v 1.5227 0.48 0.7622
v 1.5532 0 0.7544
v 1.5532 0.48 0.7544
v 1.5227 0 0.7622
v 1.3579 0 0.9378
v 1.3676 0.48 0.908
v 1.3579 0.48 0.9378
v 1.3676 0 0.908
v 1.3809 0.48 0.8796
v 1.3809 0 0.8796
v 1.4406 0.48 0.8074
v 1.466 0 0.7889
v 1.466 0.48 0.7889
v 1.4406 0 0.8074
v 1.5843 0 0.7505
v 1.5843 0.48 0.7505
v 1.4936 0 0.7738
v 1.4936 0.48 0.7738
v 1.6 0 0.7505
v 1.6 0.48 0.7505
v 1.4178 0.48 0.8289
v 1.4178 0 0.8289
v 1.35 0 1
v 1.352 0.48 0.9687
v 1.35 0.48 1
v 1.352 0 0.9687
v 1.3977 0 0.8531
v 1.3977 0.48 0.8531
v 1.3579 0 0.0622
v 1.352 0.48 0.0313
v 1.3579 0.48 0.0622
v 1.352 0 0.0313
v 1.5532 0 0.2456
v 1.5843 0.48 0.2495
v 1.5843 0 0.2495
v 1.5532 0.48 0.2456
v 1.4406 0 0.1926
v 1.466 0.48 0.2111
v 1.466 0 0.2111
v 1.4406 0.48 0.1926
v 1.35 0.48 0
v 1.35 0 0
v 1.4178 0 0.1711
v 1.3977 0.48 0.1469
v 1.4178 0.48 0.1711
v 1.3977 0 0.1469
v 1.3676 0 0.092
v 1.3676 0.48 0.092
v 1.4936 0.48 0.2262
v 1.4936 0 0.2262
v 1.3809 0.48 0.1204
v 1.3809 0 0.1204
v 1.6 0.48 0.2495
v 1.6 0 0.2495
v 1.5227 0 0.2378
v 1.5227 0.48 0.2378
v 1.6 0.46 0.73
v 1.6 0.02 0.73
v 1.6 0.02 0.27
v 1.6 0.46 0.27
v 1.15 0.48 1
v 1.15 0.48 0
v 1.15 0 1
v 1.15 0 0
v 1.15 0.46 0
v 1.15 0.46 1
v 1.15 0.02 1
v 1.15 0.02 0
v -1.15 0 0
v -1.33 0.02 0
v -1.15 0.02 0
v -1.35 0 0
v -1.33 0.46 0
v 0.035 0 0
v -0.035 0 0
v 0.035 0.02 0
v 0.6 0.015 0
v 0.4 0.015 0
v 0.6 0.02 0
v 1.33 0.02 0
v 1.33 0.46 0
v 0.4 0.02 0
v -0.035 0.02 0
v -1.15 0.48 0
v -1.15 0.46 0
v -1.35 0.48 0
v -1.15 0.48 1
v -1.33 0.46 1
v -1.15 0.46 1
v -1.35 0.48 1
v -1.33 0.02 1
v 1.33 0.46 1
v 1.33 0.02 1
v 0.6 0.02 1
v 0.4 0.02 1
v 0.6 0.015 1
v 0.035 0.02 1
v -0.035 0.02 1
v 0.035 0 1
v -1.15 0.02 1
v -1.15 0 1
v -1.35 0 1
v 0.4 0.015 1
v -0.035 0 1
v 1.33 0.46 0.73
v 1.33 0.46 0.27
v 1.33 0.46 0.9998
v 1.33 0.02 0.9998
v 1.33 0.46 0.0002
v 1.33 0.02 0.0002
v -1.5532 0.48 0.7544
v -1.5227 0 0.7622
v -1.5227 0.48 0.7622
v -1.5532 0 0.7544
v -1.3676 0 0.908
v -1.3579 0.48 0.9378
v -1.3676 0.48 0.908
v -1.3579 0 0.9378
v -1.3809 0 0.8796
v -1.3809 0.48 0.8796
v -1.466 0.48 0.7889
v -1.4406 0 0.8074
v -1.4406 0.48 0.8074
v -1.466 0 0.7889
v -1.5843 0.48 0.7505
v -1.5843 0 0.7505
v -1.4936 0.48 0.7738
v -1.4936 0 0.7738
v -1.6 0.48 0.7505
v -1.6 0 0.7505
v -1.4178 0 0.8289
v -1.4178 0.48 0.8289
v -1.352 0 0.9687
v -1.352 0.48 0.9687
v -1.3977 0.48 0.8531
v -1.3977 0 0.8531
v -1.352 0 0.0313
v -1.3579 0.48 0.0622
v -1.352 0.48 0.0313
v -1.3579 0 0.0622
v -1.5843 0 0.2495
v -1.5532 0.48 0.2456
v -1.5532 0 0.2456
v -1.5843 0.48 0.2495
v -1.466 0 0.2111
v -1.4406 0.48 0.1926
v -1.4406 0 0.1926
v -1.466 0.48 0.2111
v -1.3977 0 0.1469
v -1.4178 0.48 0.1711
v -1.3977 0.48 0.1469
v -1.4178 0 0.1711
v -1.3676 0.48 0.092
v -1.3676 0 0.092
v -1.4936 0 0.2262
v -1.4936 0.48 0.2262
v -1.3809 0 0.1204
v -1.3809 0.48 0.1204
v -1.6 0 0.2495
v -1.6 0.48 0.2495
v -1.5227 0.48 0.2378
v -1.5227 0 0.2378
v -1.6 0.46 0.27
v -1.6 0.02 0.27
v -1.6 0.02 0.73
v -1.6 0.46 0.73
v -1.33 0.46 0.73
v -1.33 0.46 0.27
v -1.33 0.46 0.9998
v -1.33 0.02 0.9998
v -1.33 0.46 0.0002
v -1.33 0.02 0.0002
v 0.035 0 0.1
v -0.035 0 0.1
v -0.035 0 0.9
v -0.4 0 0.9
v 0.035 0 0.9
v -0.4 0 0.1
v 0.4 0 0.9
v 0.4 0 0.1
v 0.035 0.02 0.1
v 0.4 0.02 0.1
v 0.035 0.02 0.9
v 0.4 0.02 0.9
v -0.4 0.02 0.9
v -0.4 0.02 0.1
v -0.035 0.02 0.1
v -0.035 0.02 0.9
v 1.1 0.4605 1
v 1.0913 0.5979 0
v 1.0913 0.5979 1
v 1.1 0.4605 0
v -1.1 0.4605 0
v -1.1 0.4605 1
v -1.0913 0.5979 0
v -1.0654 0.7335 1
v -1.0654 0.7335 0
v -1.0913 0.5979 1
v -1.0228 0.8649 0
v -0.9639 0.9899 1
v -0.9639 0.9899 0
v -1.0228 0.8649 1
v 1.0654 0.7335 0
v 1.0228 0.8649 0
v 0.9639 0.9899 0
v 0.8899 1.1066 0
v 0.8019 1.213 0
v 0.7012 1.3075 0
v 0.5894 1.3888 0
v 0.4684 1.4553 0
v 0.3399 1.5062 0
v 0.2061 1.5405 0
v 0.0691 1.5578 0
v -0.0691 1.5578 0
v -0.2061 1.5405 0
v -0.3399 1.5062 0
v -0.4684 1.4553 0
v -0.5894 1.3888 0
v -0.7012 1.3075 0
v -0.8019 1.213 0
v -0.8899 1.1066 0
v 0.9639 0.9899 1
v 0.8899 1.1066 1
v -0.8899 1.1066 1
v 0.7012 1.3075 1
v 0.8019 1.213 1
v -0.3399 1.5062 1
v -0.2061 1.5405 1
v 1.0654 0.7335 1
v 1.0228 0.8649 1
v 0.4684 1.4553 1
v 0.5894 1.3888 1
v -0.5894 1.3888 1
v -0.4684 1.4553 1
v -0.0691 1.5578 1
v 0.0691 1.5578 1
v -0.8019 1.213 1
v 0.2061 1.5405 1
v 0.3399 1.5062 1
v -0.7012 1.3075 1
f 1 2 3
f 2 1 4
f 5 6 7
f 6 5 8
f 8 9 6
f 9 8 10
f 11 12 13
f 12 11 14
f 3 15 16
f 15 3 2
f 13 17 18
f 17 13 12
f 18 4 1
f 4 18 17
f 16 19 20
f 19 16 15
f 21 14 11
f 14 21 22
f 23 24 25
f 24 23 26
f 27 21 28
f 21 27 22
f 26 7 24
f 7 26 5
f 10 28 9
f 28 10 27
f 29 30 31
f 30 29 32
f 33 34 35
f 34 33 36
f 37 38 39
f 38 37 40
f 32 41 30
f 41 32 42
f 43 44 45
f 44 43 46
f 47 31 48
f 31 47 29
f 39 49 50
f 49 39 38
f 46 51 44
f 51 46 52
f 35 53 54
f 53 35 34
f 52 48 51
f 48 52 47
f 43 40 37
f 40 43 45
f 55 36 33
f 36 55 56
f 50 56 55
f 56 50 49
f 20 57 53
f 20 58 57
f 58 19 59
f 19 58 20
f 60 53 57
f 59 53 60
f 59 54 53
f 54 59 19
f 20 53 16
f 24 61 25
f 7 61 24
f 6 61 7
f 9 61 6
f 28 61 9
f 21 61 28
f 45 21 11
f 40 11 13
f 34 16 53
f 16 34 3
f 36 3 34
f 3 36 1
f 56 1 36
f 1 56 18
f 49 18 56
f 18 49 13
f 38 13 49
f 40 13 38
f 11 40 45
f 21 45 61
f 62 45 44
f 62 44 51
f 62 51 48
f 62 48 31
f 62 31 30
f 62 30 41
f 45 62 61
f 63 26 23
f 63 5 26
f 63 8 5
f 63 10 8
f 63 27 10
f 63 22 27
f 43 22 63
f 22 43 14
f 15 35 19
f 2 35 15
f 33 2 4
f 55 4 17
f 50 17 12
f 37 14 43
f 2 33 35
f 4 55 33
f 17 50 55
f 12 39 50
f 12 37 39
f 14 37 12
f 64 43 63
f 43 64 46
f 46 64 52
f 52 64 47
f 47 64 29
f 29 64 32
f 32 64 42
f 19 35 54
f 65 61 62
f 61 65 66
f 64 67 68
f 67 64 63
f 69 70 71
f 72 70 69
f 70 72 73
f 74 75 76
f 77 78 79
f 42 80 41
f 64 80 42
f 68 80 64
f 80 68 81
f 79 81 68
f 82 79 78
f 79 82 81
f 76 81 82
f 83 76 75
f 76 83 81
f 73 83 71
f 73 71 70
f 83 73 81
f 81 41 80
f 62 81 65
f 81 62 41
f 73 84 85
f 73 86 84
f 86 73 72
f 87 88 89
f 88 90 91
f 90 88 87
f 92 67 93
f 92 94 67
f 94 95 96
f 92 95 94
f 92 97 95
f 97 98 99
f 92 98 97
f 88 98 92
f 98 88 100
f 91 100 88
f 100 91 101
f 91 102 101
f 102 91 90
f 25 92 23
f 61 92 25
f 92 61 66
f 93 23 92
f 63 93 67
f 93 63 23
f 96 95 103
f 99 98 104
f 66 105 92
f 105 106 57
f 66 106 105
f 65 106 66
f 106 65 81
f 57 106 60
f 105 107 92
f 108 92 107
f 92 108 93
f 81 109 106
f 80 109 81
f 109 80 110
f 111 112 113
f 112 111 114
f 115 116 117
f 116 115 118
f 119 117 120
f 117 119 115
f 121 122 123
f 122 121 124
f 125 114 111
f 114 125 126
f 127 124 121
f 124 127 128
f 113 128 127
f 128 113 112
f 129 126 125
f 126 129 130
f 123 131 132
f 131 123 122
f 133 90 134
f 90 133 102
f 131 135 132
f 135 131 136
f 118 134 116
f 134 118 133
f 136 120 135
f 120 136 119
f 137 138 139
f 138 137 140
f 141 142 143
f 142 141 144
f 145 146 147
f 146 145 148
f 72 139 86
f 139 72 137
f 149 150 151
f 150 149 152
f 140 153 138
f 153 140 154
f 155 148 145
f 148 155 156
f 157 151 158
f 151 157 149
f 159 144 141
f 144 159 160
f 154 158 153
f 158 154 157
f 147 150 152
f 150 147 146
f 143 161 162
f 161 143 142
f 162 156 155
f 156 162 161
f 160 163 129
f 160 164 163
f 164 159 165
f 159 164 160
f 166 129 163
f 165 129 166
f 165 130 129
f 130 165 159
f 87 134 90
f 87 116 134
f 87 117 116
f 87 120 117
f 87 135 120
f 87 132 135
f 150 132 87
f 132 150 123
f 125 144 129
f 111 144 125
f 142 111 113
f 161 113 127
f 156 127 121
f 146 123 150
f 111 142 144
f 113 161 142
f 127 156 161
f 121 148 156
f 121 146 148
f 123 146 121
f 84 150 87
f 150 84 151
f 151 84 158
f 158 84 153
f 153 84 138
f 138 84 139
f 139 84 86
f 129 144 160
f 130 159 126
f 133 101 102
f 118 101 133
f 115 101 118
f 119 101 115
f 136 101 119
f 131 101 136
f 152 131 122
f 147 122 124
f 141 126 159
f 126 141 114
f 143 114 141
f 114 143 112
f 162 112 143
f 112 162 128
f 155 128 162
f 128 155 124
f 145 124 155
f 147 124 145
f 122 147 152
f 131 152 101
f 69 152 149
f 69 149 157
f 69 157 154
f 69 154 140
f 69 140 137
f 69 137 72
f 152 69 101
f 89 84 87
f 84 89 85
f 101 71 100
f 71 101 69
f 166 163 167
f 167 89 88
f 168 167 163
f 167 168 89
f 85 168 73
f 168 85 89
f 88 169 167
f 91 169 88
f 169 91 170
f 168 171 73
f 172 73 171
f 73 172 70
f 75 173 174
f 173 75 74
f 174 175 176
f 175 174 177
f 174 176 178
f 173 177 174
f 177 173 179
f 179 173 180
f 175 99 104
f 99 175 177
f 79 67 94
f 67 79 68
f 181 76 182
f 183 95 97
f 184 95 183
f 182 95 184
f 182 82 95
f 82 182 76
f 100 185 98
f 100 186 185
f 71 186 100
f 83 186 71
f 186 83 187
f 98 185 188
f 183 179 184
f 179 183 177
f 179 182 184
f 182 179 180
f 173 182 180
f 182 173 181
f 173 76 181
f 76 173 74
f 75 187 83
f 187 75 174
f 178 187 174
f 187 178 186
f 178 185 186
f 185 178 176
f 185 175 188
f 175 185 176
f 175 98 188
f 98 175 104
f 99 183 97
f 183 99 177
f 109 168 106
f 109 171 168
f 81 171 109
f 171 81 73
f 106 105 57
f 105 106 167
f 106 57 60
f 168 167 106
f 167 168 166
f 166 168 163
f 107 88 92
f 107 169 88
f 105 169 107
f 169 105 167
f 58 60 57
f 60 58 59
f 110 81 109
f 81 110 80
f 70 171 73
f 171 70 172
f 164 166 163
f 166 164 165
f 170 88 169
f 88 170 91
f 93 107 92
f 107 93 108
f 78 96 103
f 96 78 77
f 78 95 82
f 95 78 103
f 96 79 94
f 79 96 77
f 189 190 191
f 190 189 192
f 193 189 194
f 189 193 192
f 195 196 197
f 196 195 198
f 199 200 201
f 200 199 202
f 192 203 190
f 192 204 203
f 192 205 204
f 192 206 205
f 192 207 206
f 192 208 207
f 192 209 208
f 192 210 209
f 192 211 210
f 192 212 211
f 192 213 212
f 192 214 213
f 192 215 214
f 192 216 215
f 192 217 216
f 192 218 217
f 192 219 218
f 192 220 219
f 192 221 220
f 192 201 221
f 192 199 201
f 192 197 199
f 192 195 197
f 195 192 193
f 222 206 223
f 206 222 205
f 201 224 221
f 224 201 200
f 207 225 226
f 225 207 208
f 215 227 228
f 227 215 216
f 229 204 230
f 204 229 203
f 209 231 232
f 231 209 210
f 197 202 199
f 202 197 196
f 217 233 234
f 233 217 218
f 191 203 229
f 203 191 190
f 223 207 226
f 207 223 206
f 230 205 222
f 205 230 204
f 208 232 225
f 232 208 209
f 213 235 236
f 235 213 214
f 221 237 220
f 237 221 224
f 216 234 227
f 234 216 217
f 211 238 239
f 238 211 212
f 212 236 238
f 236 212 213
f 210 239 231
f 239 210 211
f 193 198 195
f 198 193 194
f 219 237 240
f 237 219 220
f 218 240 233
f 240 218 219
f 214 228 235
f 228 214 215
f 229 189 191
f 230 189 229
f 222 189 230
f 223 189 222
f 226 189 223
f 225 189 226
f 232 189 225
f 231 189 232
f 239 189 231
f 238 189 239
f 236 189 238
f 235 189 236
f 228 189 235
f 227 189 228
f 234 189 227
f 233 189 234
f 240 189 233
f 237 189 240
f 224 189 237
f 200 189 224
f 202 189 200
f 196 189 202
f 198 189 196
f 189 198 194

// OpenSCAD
//by Knochi 2022/12/01 - mail@knochi.de
//export to .csg then open in FreeCad and save to KiCAD using KicadStepUp Workbench

/* [Dimensions] */
bodyDims=[3.2,1.0,0.48]; //including pads
capWidth=0.45;
filRad=0.25;
plating=0.02;
marking=0.005;
domeDia=2.2;


/* [Hidden] */
$fn=50;
fudge=0.1;
ledAlpha=0.1;
glassAlpha=0.39;

metalGreyPinCol=    [0.824, 0.820,  0.781];
metalGreyCol=       [0.298, 0.298,  0.298]; //metal Grey
metalCopperCol=     [0.7038,0.27048,0.0828]; //metal Copper
metalAluminiumCol=  [0.372322, 0.371574, 0.373173];
metalBronzeCol=     [0.714, 0.4284, 0.18144];
metalSilverCol=     [0.50754, 0.50754, 0.50754];
resblackBodyCol=    [0.082, 0.086,  0.094]; //resistor black body
darkGreyBodyCol=    [0.273, 0.273,  0.273]; //dark grey body
brownBodyCol=       [0.379, 0.270,  0.215]; //brown Body
lightBrownBodyCol=  [0.883, 0.711,  0.492]; //light brown body
pinkBodyCol=        [0.578, 0.336,  0.352]; //pink body
blueBodyCol=        [0.137, 0.402,  0.727]; //blue body
greenBodyCol=       [0.340, 0.680,  0.445]; //green body
orangeBodyCol=      [0.809, 0.426,  0.148]; //orange body
redBodyCol=         [0.700, 0.100,  0.050]; 
yellowBodyCol=      [0.832, 0.680,  0.066];
whiteBodyCol=       [0.895, 0.891,  0.813];
metalGoldPinCol=    [0.859, 0.738,  0.496];
blackBodyCol=       [0.148, 0.145,  0.145];
greyBodyCol=        [0.250, 0.262,  0.281];
lightBrownLabelCol= [0.691, 0.664,  0.598];
ledBlueCol=         [0.700, 0.100,  0.050, ledAlpha];
ledYellowCol=       [0.100, 0.250,  0.700, ledAlpha];
ledGreyCol=         [0.98,  0.840,  0.066, ledAlpha];
ledWhiteCol=        [0.895, 0.891, 0.813, ledAlpha];
ledgreyCol=         [0.27, 0.25, 0.27, ledAlpha];
ledBlackCol=        [0.1, 0.05, 0.1];
ledGreenCol=        [0.400, 0.700,  0.150, ledAlpha];
glassGreyCol=       [0.400769, 0.441922, 0.459091, glassAlpha];
glassGoldCol=       [0.566681, 0.580872, 0.580874, glassAlpha];
glassBlueCol=       [0.000000, 0.631244, 0.748016, glassAlpha];
glassGreenCol=      [0.000000, 0.75, 0.44, glassAlpha];
glassOrangeCol=     [0.75, 0.44, 0.000000, glassAlpha];
pcbGreenCol=        [0.07,  0.3,    0.12]; //pcb green
pcbBlackCol=        [0.16,  0.16,   0.16]; //pcb black
pcbBlue=            [0.07,  0.12,   0.3];
FR4darkCol=         [0.2,   0.17,   0.087]; //?
FR4Col=             [0.43,  0.46,   0.295]; //?



assembly();

module assembly(){
  translate([0,bodyDims.z-plating,0]) dome();
  translate([0,0,bodyDims.y/2]) rotate([-90,0,0]){
    for (im=[0,1])
        mirror([im,0,0]) translate([bodyDims.x/2,0,0]) color(metalGoldPinCol) cap();
    cntrPad();
    body();
    marking();
  }
}

module body(){
    //plating
  translate([0,0,plating]) color(whiteBodyCol) linear_extrude(bodyDims.z-plating*2) 
    difference(){
      square([bodyDims.x,bodyDims.y],true);
      for (ix=[-1,1],iy=[-1,1])
        translate([ix*(bodyDims.x/2),iy*(bodyDims.y/2)]) circle(filRad+plating);
    }
}

module cap(){
    translate([-capWidth/2,0,bodyDims.z/2]) difference(){
      cube([capWidth,bodyDims.y,bodyDims.z],true);
      for (iy=[-1,1])
        translate([capWidth/2,iy*bodyDims.y/2]) cylinder(r=filRad,h=bodyDims.z+fudge,center=true);
      cube([capWidth+fudge,bodyDims.y-filRad*2-plating*2,bodyDims.z-plating*2],true);

      translate([-(capWidth-(capWidth-filRad-plating)+fudge)/2,0,0]) 
        cube([capWidth-filRad-plating+fudge,bodyDims.y+fudge,bodyDims.z-plating*2],true);
    }
  }

module cntrPad(){
color(metalGoldPinCol) linear_extrude(plating){
    square(0.8,true);
    square([0.07,bodyDims.y],true);
}
}

*dome();
module dome(){
  color(ledWhiteCol) linear_extrude(height = bodyDims.y) difference(){
    circle(d=domeDia);
    //need a very small gap to prevent bottom face from dissapearing
    translate([0,-(domeDia+fudge-0.001)/2]) square(domeDia+fudge,true);
  }
}

*marking();
module marking(){
  translate([(0.8+0.2)/2,0,plating-marking]) color(greenBodyCol) linear_extrude(marking) square([0.2,bodyDims.y],true);
}
